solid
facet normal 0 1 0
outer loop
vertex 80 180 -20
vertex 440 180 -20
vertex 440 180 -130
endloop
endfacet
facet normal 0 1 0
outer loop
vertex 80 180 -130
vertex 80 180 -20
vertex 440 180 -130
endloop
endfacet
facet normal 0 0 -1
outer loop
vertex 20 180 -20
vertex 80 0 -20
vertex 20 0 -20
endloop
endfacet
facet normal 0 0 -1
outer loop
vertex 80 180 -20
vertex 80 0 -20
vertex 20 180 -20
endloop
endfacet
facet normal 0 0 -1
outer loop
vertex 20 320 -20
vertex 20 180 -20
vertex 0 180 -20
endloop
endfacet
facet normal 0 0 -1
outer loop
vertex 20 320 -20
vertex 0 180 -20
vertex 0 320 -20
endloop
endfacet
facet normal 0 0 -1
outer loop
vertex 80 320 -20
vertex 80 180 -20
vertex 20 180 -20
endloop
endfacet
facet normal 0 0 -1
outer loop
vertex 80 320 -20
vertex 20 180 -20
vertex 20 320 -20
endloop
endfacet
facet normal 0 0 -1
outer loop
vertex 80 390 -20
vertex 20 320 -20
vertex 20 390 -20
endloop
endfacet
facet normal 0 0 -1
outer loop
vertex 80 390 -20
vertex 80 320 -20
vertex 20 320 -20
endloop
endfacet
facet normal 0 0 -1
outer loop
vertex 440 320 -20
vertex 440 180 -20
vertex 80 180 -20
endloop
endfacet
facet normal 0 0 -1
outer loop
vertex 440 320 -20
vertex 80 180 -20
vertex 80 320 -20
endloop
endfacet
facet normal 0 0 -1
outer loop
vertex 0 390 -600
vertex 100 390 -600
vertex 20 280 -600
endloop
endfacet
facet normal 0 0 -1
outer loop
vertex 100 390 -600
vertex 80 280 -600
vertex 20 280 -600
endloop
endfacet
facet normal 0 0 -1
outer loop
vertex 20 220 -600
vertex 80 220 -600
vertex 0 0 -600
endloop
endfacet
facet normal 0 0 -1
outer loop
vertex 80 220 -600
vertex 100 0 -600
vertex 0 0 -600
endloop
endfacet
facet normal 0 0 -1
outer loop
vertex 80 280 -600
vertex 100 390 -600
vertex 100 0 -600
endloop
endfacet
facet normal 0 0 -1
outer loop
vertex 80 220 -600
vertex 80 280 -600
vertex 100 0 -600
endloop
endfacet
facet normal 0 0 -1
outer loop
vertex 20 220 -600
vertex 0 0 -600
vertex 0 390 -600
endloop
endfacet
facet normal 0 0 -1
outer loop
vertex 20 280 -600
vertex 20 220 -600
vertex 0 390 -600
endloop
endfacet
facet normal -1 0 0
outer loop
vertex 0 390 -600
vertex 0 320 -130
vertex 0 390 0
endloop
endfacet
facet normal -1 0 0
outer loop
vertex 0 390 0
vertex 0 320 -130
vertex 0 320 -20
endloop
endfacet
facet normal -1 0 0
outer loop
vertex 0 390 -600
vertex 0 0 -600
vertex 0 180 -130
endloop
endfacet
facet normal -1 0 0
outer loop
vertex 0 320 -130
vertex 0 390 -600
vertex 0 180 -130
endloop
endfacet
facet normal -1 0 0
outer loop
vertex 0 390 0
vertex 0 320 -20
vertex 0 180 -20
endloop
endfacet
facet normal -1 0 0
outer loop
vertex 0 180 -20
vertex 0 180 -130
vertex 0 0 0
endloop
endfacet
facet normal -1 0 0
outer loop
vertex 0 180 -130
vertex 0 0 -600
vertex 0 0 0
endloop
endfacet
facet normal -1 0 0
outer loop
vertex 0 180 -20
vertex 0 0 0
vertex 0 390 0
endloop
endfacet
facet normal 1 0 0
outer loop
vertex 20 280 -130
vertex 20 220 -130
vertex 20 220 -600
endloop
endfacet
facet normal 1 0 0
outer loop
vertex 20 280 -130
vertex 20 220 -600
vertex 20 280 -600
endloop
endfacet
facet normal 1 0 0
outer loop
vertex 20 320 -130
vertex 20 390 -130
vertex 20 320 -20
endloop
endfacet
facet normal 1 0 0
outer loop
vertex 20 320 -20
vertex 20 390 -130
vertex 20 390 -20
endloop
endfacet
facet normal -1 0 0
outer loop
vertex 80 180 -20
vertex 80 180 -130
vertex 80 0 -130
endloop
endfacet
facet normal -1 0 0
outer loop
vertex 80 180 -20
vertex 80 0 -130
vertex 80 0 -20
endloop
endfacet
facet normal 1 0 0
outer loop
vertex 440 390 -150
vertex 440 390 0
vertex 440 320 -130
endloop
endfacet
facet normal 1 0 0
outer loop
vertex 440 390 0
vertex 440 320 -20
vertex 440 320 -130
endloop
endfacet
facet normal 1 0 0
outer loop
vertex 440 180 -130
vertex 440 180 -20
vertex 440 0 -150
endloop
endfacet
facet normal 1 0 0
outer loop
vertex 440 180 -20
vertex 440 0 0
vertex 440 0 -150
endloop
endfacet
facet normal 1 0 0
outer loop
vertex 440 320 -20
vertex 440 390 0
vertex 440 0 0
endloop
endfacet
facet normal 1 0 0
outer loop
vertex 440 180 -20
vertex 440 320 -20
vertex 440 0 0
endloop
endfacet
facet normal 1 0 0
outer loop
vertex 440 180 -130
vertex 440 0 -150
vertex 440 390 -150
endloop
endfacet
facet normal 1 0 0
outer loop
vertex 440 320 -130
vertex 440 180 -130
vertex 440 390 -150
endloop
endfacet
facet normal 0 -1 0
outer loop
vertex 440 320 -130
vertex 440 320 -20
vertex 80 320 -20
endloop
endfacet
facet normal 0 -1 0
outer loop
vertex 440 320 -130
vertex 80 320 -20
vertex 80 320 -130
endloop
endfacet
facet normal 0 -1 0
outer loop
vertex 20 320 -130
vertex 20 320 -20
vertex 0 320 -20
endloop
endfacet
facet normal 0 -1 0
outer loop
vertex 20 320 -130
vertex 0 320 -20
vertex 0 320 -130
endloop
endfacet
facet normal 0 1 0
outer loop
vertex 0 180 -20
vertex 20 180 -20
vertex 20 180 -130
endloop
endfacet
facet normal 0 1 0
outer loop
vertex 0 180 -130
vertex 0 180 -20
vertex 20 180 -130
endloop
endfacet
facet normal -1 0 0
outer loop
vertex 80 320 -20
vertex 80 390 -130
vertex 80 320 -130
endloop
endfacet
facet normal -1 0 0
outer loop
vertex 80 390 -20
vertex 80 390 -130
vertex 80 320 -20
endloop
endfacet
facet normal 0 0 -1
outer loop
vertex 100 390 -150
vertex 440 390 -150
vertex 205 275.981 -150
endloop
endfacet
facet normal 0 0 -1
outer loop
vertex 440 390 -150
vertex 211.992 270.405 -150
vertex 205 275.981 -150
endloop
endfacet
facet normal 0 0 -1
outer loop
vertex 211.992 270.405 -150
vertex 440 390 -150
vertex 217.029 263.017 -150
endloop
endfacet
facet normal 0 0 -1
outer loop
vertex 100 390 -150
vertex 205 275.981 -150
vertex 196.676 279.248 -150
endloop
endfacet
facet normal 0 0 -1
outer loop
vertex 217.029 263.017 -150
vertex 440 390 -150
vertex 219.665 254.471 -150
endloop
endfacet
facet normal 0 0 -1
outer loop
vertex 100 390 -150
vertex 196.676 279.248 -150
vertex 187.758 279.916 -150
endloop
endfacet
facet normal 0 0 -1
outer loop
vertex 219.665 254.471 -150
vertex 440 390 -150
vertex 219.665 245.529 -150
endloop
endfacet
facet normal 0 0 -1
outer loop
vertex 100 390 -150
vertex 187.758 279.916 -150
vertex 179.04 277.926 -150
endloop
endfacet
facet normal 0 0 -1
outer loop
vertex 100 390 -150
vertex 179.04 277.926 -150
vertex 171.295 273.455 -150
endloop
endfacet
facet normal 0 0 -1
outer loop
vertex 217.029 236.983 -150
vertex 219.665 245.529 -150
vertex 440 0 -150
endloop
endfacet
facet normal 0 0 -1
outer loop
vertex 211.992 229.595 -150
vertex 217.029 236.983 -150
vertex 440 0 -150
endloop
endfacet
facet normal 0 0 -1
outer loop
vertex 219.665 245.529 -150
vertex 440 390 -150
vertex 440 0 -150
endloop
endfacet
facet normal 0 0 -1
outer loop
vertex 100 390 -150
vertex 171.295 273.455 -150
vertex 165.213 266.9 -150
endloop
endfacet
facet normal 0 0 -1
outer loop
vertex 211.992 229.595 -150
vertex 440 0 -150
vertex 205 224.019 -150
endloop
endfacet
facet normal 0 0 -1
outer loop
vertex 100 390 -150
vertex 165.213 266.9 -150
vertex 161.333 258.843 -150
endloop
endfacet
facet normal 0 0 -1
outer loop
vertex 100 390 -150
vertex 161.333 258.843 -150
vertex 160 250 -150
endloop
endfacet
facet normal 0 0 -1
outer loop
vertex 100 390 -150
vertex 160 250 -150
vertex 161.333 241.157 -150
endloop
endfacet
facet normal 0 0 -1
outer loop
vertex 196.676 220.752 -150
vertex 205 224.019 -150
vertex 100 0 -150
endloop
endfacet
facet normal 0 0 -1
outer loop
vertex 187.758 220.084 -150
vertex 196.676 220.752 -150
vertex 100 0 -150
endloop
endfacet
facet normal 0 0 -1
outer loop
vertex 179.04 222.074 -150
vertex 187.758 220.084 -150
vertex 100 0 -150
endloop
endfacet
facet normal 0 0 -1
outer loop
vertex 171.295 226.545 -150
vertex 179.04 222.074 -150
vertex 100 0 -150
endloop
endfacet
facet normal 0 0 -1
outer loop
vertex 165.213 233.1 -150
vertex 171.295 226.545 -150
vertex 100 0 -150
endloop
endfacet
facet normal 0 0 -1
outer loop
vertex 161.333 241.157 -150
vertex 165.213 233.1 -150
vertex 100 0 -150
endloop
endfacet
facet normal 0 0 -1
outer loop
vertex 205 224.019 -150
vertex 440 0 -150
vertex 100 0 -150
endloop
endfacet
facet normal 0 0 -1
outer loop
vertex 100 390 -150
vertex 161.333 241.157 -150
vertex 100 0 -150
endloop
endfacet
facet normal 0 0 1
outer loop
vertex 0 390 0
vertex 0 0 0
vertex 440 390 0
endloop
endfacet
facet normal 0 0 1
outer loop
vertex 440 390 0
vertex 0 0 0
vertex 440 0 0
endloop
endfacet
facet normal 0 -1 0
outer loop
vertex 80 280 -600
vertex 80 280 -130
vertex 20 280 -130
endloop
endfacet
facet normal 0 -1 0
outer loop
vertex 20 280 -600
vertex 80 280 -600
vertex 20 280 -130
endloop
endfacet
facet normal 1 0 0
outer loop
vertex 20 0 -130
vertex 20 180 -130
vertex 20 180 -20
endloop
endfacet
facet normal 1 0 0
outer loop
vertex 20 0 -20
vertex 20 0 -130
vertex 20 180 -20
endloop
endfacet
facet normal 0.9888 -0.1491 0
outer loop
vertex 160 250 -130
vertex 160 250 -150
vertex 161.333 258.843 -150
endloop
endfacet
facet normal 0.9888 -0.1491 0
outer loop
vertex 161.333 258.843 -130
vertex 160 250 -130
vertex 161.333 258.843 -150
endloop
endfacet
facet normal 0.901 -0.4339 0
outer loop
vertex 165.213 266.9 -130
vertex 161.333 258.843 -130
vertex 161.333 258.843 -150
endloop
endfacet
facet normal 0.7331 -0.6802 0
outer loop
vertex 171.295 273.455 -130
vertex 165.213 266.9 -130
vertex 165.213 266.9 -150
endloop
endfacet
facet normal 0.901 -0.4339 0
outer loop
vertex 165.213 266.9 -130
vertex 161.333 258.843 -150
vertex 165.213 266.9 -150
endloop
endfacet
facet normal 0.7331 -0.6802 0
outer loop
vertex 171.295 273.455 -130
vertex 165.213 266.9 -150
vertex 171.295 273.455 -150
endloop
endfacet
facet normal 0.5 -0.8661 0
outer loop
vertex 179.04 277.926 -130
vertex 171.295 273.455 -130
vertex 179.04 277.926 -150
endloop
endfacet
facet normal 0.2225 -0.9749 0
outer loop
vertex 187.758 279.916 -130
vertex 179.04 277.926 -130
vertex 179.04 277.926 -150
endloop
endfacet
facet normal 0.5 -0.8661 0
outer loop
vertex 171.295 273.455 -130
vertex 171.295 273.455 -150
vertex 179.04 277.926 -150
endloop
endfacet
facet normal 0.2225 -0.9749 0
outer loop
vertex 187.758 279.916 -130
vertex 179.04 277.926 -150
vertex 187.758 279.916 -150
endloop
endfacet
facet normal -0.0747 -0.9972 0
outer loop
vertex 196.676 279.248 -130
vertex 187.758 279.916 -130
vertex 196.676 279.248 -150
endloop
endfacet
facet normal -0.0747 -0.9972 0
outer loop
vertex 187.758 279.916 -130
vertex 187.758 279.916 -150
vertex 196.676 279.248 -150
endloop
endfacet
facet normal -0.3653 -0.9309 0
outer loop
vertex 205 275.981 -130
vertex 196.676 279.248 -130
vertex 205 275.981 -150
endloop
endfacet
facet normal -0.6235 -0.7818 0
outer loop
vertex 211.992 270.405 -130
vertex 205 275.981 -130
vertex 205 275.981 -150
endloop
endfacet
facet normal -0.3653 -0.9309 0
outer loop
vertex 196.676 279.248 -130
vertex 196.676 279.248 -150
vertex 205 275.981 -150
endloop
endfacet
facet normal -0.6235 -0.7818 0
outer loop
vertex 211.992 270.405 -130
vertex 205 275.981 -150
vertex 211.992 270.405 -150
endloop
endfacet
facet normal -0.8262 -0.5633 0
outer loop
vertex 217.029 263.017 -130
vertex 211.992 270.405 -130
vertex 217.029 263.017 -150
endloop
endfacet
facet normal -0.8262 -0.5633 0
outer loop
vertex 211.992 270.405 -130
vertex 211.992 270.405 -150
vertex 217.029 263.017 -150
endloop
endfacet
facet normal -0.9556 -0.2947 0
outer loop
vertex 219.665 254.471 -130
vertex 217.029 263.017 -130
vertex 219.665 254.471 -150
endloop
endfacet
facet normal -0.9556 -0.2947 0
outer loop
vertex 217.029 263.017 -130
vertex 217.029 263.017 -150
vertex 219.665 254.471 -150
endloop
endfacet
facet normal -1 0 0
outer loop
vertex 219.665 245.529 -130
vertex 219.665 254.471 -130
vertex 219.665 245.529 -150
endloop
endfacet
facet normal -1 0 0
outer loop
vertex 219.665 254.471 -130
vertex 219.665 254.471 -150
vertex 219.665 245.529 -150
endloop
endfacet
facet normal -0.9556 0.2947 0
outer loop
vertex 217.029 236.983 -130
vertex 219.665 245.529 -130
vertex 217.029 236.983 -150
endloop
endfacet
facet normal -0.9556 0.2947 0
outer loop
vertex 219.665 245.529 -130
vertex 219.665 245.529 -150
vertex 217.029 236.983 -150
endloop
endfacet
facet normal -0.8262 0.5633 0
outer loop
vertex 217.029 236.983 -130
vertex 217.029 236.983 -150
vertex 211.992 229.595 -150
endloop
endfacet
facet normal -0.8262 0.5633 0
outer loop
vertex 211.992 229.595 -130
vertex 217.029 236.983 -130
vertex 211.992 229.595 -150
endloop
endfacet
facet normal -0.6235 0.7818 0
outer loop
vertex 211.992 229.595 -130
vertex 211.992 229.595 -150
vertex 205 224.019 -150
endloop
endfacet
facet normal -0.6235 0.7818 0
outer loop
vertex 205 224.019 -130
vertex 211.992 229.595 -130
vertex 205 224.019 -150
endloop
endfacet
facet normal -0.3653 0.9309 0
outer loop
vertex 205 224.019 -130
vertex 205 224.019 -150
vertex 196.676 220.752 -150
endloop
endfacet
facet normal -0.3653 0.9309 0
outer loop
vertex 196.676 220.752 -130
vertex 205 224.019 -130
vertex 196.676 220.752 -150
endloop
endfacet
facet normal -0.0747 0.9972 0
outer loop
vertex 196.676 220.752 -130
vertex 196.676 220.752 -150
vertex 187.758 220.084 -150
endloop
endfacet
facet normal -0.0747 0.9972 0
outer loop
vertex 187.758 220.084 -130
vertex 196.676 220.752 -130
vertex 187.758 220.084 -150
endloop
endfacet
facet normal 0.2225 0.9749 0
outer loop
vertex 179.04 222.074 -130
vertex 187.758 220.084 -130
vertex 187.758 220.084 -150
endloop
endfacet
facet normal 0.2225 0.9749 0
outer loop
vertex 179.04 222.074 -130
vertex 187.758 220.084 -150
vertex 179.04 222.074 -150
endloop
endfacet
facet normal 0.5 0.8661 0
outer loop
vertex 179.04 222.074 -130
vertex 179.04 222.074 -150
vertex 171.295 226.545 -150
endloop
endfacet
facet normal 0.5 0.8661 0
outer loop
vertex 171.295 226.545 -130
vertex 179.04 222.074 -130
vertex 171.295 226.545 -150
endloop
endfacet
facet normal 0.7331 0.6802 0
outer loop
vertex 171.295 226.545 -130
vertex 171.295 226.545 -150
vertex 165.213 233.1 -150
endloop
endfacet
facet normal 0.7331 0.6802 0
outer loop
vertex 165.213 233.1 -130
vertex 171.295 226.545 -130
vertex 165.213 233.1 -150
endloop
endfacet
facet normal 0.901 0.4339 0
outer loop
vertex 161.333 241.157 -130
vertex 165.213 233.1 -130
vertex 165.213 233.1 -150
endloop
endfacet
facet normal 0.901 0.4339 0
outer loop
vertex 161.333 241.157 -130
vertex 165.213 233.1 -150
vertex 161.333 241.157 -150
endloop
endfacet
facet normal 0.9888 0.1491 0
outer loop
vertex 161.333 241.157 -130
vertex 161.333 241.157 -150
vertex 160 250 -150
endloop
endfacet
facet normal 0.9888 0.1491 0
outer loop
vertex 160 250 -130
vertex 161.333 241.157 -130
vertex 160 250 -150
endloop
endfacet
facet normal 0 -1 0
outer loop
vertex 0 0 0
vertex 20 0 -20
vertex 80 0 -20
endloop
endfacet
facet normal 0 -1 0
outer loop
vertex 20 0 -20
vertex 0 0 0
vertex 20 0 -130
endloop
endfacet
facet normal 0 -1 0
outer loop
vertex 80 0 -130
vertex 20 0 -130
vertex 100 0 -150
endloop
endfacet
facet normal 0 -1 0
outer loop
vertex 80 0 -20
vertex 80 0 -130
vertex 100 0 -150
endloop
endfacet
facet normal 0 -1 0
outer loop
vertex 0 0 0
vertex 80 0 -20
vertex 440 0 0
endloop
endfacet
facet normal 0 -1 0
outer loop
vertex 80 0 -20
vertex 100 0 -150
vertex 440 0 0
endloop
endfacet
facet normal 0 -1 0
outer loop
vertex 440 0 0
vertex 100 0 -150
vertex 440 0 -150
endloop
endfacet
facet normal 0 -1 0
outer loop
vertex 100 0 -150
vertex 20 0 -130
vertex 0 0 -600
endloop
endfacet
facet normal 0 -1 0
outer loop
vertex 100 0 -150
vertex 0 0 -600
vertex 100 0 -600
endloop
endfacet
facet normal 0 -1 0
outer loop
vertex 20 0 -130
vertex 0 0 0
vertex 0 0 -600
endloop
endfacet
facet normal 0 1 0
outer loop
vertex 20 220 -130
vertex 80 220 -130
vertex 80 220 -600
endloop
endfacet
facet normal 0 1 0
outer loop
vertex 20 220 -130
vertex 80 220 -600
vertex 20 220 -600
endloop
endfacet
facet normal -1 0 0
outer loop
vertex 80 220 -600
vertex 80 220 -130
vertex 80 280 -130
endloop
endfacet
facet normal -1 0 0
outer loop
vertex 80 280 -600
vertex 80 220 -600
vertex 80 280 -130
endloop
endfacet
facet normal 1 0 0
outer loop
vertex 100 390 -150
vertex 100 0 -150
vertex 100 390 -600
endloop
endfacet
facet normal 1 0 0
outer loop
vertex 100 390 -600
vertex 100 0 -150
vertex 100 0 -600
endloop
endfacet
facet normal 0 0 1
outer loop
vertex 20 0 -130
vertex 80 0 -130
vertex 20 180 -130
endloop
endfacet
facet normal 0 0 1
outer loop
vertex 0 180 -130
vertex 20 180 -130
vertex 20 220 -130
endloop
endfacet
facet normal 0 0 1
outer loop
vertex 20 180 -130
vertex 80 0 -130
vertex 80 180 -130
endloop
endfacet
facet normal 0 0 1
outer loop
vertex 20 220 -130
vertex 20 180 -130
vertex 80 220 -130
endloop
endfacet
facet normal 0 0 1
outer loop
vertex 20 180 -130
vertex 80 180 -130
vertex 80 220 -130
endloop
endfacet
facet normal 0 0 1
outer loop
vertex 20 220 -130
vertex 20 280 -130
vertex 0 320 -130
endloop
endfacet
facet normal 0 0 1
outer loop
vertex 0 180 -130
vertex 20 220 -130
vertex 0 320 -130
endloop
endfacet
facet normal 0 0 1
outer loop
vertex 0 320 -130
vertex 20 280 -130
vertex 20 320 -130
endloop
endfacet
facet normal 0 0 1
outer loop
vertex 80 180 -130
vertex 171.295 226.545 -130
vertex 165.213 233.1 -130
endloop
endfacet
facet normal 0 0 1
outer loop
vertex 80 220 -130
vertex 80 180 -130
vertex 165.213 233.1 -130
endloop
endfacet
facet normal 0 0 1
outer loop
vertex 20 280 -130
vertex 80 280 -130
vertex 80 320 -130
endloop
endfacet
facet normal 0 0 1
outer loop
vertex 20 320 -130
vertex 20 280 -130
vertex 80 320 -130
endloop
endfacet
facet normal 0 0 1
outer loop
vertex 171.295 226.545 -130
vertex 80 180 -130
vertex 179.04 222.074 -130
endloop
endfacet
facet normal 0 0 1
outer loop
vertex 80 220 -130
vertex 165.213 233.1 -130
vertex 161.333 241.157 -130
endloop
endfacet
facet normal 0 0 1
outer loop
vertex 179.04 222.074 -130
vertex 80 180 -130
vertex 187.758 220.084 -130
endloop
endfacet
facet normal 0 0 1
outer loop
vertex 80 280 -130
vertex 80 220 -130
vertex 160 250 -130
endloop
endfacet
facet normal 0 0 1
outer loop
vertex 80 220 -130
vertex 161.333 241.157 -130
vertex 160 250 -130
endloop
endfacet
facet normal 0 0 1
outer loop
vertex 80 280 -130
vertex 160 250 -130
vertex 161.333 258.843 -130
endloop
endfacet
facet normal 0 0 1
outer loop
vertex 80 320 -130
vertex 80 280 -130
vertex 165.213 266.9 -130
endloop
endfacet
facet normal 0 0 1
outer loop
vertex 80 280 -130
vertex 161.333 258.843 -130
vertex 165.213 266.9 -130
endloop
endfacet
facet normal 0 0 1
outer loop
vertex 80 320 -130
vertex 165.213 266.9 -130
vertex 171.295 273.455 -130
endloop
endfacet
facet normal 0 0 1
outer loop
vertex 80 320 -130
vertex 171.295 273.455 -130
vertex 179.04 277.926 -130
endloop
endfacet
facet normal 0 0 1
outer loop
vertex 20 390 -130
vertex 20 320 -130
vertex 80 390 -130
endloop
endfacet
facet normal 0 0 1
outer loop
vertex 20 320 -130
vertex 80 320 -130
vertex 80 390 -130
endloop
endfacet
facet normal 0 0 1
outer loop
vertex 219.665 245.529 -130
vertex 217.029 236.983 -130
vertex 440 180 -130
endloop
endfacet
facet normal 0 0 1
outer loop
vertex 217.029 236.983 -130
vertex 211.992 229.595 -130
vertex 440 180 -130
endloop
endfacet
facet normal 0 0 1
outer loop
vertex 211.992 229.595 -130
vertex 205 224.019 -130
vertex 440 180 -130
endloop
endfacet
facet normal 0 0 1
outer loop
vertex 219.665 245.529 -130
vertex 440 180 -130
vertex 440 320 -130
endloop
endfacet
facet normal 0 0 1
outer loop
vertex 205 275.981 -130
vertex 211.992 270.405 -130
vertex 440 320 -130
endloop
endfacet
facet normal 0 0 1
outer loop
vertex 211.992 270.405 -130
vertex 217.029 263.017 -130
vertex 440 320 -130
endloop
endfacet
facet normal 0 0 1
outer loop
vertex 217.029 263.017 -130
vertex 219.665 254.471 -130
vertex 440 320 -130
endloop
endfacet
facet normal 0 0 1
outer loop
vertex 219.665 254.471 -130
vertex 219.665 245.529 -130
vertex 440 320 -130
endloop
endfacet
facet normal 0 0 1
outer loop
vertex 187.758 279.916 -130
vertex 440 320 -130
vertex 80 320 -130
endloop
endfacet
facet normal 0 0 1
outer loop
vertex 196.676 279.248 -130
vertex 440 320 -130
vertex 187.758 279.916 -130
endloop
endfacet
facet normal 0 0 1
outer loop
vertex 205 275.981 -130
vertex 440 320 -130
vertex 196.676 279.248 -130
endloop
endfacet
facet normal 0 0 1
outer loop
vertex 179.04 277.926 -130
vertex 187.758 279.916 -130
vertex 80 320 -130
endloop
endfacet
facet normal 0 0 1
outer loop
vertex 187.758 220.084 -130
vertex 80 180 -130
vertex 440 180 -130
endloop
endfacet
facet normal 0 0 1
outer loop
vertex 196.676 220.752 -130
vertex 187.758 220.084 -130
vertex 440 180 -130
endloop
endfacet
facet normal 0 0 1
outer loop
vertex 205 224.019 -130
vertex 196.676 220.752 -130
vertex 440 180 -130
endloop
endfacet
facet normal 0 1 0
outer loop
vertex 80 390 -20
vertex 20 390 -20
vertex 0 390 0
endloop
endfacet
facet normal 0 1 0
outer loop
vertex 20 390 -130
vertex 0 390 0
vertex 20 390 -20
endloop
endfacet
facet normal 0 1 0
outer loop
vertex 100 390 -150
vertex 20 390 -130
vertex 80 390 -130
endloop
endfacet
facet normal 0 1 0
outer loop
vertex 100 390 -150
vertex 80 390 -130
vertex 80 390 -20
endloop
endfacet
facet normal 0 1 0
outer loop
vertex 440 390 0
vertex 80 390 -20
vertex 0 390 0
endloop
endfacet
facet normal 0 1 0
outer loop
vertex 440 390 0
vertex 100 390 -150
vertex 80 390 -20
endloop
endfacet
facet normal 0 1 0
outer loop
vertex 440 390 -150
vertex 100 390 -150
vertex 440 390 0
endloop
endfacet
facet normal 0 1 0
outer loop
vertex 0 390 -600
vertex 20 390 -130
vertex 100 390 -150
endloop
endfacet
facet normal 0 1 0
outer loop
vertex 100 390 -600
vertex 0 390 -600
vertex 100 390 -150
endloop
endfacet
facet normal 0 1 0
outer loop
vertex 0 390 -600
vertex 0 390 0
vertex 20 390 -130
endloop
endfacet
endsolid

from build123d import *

# Parameters (mm, degrees)
BOSS_EXTRUDE5_DEPTH = 390
SKETCH7_R           = 30
CUT_EXTRUDE4_DEPTH  = 120
SKETCH10_W          = 110
SKETCH10_H          = 140
CUT_EXTRUDE6_DEPTH  = 841.059521701
CUT_EXTRUDE9_START  = -390
SKETCH13_W          = 30
SKETCH13_H          = 110
CUT_EXTRUDE9_DEPTH  = 390
SKETCH15_W          = 60
SKETCH15_H          = 60
CUT_EXTRUDE10_DEPTH = 470


with BuildPart() as part:
    # Sketch1 → Boss-Extrude5 (new body)
    with BuildSketch(Plane(origin=(0, 0, 0), x_dir=(1, 0, 0), z_dir=(0, 1, 0))):
        Polygon((0, 0), (440, 0), (440, 150), (100, 150), (100, 600), (0, 600), align=None)
    extrude(amount=BOSS_EXTRUDE5_DEPTH)

    # Sketch7 → Cut-Extrude4 (cut)
    with BuildSketch(Plane(origin=(0, 0, -150), x_dir=(-1, 0, 0), z_dir=(0, 0, -1))):
        with Locations((-190, 250)):
            Circle(SKETCH7_R)
    extrude(amount=-CUT_EXTRUDE4_DEPTH, mode=Mode.SUBTRACT)

    # Sketch10 → Cut-Extrude6 (cut, through all)
    with BuildSketch(Plane(origin=(440, 0, 0), x_dir=(0, 0, -1), z_dir=(1, 0, 0))):
        with Locations((75, 250)):
            Rectangle(SKETCH10_W, SKETCH10_H)
    extrude(amount=-CUT_EXTRUDE6_DEPTH, mode=Mode.SUBTRACT)

    # Sketch13 → Cut-Extrude9 (cut)
    with BuildSketch(Plane.XZ.offset(CUT_EXTRUDE9_START)):
        with Locations((65, -75)):
            Rectangle(SKETCH13_W, SKETCH13_H)
        with Locations((35, -75)):
            Rectangle(SKETCH13_W, SKETCH13_H)
    extrude(amount=CUT_EXTRUDE9_DEPTH, mode=Mode.SUBTRACT)

    # Sketch15 → Cut-Extrude10 (cut)
    with BuildSketch(Plane(origin=(0, 0, -600), x_dir=(-1, 0, 0), z_dir=(0, 0, -1))):
        with Locations((-50, 250)):
            Rectangle(SKETCH15_W, SKETCH15_H)
    extrude(amount=-CUT_EXTRUDE10_DEPTH, mode=Mode.SUBTRACT)


solid = part.part
